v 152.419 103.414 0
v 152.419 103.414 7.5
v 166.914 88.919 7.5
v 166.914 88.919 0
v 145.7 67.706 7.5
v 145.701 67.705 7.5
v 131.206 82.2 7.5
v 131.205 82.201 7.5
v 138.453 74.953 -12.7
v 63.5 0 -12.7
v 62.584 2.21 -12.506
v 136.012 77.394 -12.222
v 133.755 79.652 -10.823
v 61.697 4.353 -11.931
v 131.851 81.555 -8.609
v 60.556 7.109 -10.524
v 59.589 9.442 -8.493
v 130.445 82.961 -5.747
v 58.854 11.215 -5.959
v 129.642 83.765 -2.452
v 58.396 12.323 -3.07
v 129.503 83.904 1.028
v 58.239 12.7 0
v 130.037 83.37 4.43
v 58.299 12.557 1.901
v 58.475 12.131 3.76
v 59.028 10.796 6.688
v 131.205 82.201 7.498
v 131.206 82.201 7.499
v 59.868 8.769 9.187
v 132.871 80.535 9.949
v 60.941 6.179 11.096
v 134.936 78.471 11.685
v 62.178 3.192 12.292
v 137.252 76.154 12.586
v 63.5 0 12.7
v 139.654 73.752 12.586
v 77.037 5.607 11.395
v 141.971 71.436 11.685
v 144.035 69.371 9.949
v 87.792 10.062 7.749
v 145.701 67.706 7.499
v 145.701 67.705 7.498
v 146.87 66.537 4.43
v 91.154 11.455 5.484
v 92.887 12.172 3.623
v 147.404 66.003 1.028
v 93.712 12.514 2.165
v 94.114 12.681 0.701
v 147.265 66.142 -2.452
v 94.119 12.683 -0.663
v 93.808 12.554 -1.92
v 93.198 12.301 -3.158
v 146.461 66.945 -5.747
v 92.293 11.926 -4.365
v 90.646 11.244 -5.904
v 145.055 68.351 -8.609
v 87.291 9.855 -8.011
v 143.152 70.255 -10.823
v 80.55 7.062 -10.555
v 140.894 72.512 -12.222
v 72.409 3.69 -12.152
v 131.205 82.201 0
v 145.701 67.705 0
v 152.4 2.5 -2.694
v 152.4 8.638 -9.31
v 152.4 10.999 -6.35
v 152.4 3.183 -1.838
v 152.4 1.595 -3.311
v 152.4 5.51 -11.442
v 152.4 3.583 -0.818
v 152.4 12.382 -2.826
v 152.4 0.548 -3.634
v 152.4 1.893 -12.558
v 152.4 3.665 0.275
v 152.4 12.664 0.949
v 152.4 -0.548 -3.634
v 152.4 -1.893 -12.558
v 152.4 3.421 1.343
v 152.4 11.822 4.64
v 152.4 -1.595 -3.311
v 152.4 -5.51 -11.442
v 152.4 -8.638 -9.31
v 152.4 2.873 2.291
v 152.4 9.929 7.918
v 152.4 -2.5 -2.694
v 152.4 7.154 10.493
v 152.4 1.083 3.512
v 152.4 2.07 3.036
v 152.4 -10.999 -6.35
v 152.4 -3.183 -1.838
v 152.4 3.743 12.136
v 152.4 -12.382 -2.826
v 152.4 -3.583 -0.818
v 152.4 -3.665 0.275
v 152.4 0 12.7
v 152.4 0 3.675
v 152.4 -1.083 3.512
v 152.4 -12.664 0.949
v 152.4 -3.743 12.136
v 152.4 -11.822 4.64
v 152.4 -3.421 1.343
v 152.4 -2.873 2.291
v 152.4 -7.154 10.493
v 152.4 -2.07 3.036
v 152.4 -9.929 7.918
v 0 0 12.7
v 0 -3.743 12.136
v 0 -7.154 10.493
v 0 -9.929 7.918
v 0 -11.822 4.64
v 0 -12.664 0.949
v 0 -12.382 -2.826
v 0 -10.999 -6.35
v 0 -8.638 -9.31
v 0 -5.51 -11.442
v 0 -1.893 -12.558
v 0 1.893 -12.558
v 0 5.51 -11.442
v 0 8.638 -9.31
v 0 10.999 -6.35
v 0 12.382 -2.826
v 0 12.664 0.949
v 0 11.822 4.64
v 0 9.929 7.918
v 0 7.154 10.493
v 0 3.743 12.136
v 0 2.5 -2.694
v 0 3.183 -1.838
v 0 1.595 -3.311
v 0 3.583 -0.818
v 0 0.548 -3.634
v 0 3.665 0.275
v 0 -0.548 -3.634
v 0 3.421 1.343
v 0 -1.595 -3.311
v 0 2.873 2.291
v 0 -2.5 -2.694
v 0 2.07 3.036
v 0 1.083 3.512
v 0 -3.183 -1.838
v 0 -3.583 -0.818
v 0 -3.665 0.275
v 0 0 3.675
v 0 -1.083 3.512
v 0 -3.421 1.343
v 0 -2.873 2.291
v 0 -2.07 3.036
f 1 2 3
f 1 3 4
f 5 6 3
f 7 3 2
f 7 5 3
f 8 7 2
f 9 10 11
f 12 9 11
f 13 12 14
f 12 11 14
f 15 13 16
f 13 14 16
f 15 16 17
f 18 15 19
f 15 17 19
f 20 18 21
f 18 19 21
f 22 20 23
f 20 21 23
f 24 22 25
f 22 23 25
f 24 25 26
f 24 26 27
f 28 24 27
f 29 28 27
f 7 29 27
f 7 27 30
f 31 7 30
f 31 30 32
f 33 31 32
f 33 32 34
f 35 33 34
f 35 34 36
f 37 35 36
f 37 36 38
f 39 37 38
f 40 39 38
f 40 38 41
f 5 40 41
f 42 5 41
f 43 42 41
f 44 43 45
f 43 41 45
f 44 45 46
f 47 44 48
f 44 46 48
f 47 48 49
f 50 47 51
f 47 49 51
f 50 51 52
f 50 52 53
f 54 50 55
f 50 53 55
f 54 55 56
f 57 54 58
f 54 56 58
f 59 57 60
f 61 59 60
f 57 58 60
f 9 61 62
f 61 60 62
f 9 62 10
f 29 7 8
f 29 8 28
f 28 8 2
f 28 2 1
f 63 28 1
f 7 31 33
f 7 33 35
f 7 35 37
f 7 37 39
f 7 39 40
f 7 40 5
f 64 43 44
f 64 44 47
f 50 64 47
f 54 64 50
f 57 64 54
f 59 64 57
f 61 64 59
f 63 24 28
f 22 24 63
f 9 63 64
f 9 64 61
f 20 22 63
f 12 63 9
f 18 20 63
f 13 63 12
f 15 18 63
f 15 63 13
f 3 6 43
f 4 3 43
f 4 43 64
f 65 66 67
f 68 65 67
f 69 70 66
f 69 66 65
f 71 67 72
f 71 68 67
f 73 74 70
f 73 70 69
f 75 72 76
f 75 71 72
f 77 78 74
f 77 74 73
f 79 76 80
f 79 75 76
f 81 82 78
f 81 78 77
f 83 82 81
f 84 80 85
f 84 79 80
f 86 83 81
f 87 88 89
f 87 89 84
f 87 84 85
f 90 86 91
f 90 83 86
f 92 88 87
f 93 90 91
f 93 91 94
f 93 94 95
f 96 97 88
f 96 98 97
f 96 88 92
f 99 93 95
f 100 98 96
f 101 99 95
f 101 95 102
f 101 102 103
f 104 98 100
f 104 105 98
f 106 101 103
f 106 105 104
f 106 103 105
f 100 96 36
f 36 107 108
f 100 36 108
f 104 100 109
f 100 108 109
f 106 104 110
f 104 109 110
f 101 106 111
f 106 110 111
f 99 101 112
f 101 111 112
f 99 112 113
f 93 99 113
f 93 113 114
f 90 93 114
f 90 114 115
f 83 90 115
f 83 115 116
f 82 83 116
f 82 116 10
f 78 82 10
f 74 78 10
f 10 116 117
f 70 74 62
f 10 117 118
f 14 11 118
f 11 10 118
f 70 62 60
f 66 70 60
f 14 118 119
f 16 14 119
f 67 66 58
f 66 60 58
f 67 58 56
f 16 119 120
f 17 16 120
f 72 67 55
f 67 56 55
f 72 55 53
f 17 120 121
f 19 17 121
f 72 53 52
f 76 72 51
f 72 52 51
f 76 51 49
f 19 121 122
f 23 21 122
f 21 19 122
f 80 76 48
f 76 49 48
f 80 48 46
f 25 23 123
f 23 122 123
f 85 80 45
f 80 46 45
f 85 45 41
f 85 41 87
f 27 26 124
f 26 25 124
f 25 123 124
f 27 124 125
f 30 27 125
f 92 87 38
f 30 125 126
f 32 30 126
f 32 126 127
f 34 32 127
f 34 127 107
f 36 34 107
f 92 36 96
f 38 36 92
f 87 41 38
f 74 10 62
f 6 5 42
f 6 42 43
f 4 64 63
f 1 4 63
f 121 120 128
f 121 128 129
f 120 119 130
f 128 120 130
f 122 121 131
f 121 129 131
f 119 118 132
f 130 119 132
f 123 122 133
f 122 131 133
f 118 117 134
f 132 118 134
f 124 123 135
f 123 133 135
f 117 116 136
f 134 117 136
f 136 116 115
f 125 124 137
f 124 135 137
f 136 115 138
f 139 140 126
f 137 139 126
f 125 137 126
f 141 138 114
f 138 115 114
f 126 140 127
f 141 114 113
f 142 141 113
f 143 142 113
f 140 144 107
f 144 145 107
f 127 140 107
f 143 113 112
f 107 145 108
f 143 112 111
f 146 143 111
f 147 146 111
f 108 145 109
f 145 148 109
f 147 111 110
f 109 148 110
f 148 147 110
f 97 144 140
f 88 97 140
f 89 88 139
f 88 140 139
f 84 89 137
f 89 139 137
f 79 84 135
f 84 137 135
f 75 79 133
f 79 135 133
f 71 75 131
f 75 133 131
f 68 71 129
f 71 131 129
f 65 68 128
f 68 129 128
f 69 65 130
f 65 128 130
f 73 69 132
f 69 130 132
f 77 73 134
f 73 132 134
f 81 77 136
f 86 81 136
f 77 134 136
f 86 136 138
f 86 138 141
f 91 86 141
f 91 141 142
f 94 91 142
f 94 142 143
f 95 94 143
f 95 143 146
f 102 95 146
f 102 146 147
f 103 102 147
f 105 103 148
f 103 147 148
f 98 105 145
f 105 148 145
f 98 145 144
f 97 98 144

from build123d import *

# Parameters (mm, degrees)
SKETCH1_R           = 12.7
BOSS_EXTRUDE1_DEPTH = 152.4
SKETCH5_R           = 12.7
BOSS_EXTRUDE3_DEPTH = 106
SKETCH6_W           = 7.5
SKETCH6_H           = 20.5
BOSS_EXTRUDE5_DEPTH = 30
SKETCH7_R           = 3.675
CUT_EXTRUDE1_DEPTH  = 152.4


with BuildPart() as part:
    # Sketch1 → Boss-Extrude1 (new body)
    with BuildSketch(Plane(origin=(0, 0, 0), x_dir=(0, 0, -1), z_dir=(1, 0, 0))):
        with Locations(Location((0, 0, 0), (0, 0, 180))):
            Circle(SKETCH1_R)
    extrude(amount=BOSS_EXTRUDE1_DEPTH)

    # Sketch5 → Boss-Extrude3 (add)
    with BuildSketch(Plane(origin=(31.75, 31.75, 0), x_dir=(0.7071067811865464, -0.7071067811865488, 0), z_dir=(0.7071067811865488, 0.7071067811865464, 0))):
        with Locations(Location((44.901280605, 0, 0), (0, 0, 90))):
            Circle(SKETCH5_R)
    extrude(amount=BOSS_EXTRUDE3_DEPTH)

    # Sketch6 → Boss-Extrude5 (add)
    with BuildSketch(Plane(origin=(106.703318806, 106.703318806, 0), x_dir=(0, 0, -1), z_dir=(0.7071067811865487, 0.7071067811865465, 0))):
        with Locations((-3.75, -44.901280605)):
            Rectangle(SKETCH6_W, SKETCH6_H)
    extrude(amount=BOSS_EXTRUDE5_DEPTH)

    # Sketch7 → Cut-Extrude1 (cut)
    with BuildSketch(Plane.ZY):
        Circle(SKETCH7_R)
    extrude(amount=-CUT_EXTRUDE1_DEPTH, mode=Mode.SUBTRACT)


solid = part.part
